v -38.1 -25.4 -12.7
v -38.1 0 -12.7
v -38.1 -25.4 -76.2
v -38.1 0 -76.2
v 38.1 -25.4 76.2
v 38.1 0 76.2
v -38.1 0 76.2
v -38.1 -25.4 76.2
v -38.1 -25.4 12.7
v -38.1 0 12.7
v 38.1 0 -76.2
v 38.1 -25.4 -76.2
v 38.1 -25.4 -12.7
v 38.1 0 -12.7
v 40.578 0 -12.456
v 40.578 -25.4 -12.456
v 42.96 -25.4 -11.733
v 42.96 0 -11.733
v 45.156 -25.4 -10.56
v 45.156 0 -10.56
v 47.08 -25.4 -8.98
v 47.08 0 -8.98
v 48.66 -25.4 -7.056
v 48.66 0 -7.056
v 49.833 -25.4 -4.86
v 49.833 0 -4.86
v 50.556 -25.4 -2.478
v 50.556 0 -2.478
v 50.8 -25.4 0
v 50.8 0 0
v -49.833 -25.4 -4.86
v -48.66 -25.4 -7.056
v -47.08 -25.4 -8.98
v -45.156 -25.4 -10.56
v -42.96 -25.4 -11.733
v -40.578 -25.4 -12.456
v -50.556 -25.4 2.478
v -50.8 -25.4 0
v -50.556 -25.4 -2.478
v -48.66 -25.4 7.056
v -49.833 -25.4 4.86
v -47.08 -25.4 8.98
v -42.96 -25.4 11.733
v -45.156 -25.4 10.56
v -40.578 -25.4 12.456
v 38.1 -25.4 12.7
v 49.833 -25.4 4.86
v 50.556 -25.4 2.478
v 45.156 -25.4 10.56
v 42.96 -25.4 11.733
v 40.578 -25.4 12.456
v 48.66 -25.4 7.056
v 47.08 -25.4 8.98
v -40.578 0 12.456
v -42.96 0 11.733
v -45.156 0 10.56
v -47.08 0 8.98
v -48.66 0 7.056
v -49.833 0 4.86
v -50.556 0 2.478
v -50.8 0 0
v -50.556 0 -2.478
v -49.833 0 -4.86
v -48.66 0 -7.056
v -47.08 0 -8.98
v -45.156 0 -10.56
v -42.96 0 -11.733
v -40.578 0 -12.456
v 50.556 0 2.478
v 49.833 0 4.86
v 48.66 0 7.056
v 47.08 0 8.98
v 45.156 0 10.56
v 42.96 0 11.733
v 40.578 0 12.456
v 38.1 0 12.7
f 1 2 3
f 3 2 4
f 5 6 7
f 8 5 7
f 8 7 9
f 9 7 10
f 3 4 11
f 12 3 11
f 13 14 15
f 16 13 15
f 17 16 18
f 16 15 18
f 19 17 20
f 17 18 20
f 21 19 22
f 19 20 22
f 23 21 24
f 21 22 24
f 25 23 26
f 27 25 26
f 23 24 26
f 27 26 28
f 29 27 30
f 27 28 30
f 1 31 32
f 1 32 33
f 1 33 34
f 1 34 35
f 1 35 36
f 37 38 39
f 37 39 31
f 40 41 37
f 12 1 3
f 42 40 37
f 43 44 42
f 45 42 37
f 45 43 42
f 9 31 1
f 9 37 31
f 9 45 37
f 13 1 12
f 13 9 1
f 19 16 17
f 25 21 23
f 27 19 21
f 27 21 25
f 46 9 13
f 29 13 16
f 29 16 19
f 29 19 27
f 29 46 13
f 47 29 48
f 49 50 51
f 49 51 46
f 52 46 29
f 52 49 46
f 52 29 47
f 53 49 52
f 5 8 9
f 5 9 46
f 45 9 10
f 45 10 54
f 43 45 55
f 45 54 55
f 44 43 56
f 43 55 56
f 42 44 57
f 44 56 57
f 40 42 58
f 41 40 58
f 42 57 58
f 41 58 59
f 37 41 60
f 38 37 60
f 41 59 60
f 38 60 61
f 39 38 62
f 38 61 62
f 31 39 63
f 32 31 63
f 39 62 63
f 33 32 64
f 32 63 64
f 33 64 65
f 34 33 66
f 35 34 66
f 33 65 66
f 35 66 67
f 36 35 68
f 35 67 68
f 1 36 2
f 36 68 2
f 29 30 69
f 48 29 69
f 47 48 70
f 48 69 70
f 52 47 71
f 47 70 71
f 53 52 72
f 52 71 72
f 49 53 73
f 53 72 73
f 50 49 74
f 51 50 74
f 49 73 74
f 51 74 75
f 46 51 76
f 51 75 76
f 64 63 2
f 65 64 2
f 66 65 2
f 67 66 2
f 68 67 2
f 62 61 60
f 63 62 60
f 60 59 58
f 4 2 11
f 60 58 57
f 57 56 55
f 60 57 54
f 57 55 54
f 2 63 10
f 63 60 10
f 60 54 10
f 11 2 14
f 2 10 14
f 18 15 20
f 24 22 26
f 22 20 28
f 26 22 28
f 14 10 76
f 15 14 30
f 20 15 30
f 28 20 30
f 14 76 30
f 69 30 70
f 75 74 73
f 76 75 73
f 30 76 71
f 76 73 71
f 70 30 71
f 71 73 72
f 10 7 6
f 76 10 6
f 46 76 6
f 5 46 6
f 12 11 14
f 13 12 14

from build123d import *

# Parameters (mm, degrees)
F1_DEPTH = 25.4


with BuildPart() as f1:
    # F0 (on Front) → F1 (new body)
    with BuildSketch(Plane.XZ):
        with BuildLine():
            Line((-38.1, -76.2), (38.1, -76.2))
            Line((38.1, -76.2), (38.1, -12.7))
            ThreePointArc((38.1, -12.7), (25.4, 0), (38.1, 12.7))
            Line((38.1, 12.7), (38.1, 76.2))
            Line((38.1, 76.2), (-38.1, 76.2))
            Line((-38.1, 76.2), (-38.1, 12.7))
            ThreePointArc((-38.1, 12.7), (-29.1197438789, 8.9802561211), (-25.4, 0))
            ThreePointArc((-25.4, 0), (-29.1197438789, -8.9802561211), (-38.1, -12.7))
            Line((-38.1, -12.7), (-38.1, -76.2))
        make_face()
        with BuildLine():
            ThreePointArc((38.1, 12.7), (25.4, 0), (38.1, -12.7))
            Line((38.1, -12.7), (38.1, 12.7))
        make_face()
        with BuildLine():
            Line((38.1, 12.7), (38.1, -12.7))
            ThreePointArc((38.1, -12.7), (47.0802561211, -8.9802561211), (50.8, 0))
            ThreePointArc((50.8, 0), (47.0802561211, 8.9802561211), (38.1, 12.7))
        make_face()
        with BuildLine():
            ThreePointArc((-38.1, 12.7), (-50.8, 0), (-38.1, -12.7))
            Line((-38.1, -12.7), (-38.1, 12.7))
        make_face()
        with BuildLine():
            Line((-38.1, 12.7), (-38.1, -12.7))
            ThreePointArc((-38.1, -12.7), (-29.1197438789, -8.9802561211), (-25.4, 0))
            ThreePointArc((-25.4, 0), (-29.1197438789, 8.9802561211), (-38.1, 12.7))
        make_face()
    extrude(amount=F1_DEPTH)


solid = f1.part
